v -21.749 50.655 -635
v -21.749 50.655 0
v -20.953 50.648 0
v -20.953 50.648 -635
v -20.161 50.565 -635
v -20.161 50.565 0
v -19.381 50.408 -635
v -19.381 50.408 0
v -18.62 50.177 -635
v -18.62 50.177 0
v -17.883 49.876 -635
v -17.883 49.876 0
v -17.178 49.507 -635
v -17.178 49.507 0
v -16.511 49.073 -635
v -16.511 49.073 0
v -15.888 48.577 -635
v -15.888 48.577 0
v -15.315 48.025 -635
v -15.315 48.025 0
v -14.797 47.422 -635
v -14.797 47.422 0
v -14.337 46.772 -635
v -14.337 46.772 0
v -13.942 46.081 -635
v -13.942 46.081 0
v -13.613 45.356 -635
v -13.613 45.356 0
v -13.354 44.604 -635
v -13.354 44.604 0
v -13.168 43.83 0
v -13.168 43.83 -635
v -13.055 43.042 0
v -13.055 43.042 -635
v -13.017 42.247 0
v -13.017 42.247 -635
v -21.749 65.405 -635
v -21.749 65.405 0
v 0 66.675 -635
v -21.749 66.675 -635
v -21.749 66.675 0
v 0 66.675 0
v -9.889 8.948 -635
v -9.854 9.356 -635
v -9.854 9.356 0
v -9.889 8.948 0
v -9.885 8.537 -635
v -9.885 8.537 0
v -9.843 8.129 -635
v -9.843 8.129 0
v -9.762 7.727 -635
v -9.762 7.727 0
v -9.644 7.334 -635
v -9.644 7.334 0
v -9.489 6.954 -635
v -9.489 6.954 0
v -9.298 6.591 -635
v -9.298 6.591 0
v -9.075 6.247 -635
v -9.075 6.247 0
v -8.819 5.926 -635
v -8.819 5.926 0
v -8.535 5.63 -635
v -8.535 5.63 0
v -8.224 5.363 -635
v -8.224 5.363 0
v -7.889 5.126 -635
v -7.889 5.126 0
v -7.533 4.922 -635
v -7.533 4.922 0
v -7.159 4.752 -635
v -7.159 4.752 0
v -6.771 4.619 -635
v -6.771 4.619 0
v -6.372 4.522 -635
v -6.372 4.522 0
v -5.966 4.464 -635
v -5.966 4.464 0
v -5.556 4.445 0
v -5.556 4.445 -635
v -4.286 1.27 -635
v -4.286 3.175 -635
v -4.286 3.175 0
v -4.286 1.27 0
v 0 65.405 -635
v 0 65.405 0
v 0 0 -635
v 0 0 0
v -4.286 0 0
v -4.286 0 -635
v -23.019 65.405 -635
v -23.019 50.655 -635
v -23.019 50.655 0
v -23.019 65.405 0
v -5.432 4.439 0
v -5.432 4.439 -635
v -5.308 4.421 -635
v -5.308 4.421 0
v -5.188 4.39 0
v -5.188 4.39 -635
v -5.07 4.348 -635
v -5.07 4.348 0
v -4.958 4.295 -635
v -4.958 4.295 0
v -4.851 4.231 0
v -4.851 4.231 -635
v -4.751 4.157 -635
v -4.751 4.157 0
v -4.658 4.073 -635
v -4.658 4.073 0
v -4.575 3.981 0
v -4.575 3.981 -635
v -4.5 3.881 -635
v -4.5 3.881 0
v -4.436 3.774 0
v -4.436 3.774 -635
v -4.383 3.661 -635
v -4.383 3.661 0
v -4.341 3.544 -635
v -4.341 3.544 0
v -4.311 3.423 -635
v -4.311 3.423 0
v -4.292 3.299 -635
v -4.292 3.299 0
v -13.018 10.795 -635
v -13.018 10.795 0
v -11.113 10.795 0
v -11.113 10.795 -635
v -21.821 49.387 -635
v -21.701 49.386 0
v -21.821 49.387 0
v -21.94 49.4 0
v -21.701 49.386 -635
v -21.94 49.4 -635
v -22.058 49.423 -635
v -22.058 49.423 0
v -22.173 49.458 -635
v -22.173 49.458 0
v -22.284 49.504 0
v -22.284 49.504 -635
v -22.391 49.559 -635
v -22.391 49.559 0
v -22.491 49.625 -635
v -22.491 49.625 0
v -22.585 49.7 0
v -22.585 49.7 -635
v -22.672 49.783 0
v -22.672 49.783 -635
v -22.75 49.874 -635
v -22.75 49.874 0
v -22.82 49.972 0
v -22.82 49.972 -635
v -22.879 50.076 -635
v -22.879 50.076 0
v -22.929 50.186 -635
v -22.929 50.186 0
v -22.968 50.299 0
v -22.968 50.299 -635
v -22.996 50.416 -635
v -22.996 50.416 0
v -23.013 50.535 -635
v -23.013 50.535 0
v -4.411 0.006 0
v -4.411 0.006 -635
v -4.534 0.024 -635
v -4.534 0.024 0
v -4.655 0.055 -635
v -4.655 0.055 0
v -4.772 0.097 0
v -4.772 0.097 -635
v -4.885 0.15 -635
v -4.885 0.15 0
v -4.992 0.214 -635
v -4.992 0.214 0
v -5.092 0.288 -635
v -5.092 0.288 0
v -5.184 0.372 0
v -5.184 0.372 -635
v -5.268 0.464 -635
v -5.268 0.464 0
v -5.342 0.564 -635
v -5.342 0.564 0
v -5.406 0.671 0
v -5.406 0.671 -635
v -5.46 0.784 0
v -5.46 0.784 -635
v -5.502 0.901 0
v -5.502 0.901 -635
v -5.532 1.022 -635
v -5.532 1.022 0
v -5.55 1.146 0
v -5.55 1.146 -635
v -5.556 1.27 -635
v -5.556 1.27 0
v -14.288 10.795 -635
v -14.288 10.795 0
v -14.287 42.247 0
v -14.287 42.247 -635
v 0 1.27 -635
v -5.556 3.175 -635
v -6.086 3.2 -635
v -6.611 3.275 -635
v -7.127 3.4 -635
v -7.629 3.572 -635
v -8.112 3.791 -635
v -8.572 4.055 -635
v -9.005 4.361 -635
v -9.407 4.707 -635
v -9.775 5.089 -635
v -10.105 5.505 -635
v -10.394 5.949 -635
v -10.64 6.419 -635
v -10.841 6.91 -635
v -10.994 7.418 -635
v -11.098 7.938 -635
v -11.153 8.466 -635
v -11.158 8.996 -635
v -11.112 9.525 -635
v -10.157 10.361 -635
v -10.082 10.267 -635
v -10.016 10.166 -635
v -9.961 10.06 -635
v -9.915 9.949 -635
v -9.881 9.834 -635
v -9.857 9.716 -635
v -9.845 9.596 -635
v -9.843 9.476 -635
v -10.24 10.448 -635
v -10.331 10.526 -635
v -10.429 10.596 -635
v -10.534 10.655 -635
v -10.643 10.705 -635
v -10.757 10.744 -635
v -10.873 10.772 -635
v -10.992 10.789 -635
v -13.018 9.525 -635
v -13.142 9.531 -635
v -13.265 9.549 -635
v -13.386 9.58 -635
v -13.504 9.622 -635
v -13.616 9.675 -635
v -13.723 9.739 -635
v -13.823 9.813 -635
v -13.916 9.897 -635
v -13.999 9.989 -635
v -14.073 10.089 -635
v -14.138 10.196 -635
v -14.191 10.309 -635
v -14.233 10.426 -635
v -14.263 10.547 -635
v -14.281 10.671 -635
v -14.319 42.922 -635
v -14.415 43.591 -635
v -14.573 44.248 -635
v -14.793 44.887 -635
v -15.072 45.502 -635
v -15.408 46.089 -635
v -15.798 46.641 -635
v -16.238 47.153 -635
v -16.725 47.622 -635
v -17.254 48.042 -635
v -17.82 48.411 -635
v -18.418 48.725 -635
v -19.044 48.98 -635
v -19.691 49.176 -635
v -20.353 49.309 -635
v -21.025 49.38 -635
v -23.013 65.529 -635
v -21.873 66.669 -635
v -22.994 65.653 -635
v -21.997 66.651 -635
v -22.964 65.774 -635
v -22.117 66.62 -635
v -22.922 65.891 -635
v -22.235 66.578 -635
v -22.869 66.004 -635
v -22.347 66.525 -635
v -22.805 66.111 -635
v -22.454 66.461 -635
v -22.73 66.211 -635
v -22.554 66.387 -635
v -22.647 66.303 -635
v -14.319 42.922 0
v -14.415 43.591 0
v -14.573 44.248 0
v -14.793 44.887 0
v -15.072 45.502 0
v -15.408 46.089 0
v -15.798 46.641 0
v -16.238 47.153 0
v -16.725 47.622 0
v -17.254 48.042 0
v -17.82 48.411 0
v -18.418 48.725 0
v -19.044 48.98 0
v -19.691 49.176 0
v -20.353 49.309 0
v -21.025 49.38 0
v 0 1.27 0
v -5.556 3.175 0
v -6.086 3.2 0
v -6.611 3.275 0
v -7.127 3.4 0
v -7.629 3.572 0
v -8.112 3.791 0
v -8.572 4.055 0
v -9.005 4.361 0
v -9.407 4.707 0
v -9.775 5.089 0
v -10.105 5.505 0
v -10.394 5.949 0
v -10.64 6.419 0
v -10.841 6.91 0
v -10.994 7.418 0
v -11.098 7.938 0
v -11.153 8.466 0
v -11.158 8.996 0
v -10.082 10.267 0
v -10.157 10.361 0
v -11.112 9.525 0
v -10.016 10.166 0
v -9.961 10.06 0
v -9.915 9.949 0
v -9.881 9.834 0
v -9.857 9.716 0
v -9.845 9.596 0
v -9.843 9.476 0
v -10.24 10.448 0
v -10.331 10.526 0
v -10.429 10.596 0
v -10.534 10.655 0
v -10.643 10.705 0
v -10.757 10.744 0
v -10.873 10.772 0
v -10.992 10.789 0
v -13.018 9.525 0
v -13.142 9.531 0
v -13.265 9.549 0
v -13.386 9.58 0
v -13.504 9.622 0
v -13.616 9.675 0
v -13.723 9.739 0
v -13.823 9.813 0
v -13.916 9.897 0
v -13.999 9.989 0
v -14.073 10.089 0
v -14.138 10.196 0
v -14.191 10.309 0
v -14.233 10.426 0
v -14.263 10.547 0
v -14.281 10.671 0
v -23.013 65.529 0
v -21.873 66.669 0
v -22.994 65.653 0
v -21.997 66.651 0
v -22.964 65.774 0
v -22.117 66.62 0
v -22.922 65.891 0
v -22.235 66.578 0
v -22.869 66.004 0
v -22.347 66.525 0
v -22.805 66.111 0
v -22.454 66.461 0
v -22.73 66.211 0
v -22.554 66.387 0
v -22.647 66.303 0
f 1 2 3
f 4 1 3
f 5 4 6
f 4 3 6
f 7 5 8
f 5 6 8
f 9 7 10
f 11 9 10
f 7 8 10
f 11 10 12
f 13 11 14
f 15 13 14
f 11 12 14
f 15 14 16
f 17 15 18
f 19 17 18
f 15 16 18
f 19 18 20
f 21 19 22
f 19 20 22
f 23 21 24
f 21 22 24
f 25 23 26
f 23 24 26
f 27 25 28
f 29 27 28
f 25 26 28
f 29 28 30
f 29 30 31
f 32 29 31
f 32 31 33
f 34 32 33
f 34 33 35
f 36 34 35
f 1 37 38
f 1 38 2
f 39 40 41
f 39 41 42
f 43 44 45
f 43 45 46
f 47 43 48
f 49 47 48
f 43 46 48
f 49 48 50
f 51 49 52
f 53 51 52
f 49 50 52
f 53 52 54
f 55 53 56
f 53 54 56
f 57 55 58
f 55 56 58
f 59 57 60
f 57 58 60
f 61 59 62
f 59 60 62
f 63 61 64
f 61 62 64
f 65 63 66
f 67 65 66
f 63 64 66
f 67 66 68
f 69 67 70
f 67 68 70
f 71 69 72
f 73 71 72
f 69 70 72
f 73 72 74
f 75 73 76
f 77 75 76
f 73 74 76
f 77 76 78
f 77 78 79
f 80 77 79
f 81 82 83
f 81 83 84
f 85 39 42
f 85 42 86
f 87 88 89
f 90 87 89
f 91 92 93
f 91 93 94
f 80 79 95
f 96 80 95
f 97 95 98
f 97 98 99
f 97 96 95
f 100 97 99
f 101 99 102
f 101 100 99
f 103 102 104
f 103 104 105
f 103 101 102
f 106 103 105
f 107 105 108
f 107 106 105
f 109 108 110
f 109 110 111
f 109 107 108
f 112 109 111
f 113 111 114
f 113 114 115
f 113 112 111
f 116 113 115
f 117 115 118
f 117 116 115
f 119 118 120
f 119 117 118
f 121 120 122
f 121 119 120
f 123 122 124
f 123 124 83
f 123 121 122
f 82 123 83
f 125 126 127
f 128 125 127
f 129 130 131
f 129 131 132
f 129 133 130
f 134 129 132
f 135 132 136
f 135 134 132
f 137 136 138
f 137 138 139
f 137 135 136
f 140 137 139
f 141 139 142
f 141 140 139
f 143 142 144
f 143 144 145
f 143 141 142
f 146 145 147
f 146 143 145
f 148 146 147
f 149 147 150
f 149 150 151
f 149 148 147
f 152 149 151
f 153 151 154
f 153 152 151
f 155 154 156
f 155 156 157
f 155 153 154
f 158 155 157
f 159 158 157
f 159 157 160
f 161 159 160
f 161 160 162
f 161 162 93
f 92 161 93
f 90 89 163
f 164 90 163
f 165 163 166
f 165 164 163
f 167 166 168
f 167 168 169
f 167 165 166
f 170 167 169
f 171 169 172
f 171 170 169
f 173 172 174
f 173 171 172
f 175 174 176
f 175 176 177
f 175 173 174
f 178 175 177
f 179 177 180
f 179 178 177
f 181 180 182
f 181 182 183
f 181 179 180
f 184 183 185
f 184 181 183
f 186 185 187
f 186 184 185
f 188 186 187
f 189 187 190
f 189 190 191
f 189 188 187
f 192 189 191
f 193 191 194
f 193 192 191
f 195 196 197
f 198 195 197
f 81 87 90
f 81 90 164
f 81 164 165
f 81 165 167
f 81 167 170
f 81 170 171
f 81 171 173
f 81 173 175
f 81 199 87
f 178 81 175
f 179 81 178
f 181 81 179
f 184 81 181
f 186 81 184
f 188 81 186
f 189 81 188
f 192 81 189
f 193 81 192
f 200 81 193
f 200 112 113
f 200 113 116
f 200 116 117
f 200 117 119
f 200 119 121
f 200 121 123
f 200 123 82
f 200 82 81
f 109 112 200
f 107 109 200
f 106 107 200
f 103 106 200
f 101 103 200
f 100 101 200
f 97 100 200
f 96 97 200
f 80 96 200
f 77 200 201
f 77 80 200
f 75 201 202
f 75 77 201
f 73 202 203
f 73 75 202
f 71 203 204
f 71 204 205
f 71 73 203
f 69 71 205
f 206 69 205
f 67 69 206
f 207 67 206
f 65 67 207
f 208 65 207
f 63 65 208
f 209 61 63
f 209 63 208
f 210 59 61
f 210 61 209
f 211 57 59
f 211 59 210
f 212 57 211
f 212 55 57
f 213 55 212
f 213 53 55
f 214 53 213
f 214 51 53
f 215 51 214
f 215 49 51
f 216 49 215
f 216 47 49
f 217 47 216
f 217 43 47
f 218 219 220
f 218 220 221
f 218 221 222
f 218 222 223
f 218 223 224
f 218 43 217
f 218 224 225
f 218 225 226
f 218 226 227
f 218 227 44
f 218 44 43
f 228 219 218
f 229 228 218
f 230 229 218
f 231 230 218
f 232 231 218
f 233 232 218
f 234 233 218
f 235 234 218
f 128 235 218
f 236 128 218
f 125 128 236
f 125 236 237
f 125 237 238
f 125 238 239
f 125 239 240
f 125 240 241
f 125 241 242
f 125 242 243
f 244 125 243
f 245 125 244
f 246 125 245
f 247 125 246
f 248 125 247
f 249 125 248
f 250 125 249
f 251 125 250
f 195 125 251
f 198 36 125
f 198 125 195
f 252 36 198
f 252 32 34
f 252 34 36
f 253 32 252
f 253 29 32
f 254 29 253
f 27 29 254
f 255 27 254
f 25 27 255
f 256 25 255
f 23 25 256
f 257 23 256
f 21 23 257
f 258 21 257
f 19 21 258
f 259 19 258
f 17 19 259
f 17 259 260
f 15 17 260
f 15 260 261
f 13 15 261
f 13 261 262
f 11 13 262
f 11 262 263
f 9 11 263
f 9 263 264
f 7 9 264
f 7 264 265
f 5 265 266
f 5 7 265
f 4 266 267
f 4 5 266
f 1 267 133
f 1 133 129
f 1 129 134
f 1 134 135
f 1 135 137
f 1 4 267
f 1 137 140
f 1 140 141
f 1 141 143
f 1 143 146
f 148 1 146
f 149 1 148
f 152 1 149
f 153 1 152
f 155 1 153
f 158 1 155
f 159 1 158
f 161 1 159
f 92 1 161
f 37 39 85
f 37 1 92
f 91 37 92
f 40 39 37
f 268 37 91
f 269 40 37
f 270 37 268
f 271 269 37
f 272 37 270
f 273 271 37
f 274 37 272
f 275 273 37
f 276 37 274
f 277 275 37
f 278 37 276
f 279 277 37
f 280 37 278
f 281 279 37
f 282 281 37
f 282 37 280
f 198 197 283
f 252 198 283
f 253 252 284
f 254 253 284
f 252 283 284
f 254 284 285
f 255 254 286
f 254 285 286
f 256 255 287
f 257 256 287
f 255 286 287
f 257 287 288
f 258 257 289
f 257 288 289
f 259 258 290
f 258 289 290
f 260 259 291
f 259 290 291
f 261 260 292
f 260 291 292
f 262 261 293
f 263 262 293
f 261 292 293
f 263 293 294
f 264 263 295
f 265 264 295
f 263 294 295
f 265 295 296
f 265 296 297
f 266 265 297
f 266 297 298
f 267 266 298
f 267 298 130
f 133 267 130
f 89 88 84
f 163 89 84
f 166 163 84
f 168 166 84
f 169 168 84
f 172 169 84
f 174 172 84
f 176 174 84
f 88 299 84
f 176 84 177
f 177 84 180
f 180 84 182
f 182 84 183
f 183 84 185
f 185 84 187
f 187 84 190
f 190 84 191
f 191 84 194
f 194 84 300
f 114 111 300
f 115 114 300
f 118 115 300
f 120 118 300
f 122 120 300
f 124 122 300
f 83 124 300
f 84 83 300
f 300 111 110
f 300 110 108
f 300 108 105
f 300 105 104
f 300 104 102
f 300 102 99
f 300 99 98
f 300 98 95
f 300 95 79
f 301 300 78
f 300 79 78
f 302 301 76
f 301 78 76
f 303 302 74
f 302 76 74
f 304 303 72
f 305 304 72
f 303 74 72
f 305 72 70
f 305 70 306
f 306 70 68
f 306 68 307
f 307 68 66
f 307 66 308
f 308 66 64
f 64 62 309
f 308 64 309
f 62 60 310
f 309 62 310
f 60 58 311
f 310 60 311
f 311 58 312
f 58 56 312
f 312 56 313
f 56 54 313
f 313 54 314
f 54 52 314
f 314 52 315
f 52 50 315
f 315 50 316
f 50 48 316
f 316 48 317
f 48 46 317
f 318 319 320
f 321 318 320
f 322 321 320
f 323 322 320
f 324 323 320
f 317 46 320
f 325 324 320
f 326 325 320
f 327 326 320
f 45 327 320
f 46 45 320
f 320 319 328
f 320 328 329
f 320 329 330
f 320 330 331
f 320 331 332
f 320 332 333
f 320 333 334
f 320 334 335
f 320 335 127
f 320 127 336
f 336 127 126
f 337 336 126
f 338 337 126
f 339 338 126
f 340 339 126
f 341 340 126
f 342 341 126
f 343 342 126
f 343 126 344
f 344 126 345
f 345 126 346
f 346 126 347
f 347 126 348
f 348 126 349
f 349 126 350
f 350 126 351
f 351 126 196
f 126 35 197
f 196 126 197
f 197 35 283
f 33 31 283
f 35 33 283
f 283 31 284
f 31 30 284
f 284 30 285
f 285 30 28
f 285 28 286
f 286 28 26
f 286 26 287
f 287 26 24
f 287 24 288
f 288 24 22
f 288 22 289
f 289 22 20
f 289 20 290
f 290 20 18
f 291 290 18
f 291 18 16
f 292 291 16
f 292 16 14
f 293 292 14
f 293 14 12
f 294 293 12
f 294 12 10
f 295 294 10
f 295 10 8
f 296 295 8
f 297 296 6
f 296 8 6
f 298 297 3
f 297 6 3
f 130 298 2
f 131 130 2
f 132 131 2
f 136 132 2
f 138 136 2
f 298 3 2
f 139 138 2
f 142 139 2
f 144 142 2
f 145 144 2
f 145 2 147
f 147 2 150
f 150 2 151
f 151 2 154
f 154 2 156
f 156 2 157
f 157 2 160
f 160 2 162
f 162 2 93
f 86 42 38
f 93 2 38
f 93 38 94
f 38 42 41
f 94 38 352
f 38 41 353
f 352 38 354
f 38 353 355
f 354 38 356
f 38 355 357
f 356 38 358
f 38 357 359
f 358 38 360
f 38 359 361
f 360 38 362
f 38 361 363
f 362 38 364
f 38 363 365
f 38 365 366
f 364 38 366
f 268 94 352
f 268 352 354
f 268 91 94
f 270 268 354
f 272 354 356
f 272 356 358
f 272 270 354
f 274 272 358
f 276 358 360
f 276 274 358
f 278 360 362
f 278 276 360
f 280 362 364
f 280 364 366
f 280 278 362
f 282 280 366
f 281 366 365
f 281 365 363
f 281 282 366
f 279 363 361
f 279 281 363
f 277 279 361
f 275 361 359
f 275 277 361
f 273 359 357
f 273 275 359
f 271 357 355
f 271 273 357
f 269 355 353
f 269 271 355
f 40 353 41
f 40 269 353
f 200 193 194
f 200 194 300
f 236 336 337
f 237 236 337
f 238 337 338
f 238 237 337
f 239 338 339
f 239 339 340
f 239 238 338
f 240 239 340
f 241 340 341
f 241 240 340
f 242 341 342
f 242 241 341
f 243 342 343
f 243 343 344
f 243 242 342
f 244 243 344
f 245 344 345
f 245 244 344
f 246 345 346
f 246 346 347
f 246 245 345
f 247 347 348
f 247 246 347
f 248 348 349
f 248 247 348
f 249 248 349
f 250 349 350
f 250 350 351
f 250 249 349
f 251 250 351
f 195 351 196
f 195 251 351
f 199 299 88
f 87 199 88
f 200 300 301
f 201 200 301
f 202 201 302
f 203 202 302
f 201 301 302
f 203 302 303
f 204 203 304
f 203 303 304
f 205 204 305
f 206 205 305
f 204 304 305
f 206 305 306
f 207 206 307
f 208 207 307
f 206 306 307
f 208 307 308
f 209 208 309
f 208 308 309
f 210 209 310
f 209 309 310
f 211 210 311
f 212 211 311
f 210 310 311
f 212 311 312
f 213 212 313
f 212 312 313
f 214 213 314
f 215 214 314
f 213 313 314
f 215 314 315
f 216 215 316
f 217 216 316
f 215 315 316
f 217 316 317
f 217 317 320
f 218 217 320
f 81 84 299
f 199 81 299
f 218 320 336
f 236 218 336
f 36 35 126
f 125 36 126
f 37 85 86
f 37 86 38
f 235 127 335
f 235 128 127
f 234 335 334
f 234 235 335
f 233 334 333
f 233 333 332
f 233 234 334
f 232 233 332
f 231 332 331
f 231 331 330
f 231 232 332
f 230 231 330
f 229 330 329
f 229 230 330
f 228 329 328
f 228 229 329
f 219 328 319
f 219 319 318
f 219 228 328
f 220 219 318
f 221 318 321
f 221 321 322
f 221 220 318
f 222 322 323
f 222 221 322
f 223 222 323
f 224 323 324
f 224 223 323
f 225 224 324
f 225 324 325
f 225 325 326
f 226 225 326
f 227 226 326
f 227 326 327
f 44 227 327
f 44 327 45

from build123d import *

# Parameters (mm, degrees)
EXTRUDE_THIN1_DEPTH = 635
FILLET1_R           = 1.27


with BuildPart() as part:
    # Sketch1 → Extrude-Thin1 (new body)
    with BuildSketch(Plane.XY):
        with BuildLine():
            Line((0, 0), (-5.55625, 0))
            Line((-5.55625, 0), (-5.55625, 3.175))
            ThreePointArc((-5.55625, 3.175), (-9.775089119, 5.089375145), (-11.1125, 9.525))
            Line((-11.1125, 9.525), (-14.2875, 9.525))
            Line((-14.2875, 9.525), (-14.2875, 42.247372018))
            ThreePointArc((-14.2875, 42.247372018), (-16.976339174, 47.831898282), (-23.01875, 49.2125))
            Line((-23.01875, 49.2125), (-23.01875, 66.675))
            Line((-23.01875, 66.675), (0, 66.675))
            Line((0, 66.675), (0, 65.405))
            Line((0, 65.405), (-21.74875, 65.405))
            Line((-21.74875, 65.405), (-21.74875, 50.655129317))
            ThreePointArc((-21.74875, 50.655129317), (-15.595162979, 48.308005429), (-13.0175, 42.247372018))
            Line((-13.0175, 42.247372018), (-13.0175, 10.795))
            Line((-13.0175, 10.795), (-9.395900253, 10.795))
            ThreePointArc((-9.395900253, 10.795), (-8.89341428, 6.012644953), (-4.28625, 4.635165643))
            Line((-4.28625, 4.635165643), (-4.28625, 1.27))
            Line((-4.28625, 1.27), (0, 1.27))
            Line((0, 1.27), (0, 0))
        make_face()
    extrude(amount=-EXTRUDE_THIN1_DEPTH)

    # Fillet1
    fillet1_edges = [part.edges().sort_by_distance(p)[0] for p in [
        (-9.395900253, 10.795, -317.5),
        (-4.28625, 4.635165643, -317.5),
        (-5.55625, 0, -317.5),
        (-14.2875, 9.525, -317.5),
        (-23.01875, 49.2125, -317.5),
        (-23.01875, 66.675, -317.5),
    ]]
    fillet(fillet1_edges, radius=FILLET1_R)


solid = part.part
